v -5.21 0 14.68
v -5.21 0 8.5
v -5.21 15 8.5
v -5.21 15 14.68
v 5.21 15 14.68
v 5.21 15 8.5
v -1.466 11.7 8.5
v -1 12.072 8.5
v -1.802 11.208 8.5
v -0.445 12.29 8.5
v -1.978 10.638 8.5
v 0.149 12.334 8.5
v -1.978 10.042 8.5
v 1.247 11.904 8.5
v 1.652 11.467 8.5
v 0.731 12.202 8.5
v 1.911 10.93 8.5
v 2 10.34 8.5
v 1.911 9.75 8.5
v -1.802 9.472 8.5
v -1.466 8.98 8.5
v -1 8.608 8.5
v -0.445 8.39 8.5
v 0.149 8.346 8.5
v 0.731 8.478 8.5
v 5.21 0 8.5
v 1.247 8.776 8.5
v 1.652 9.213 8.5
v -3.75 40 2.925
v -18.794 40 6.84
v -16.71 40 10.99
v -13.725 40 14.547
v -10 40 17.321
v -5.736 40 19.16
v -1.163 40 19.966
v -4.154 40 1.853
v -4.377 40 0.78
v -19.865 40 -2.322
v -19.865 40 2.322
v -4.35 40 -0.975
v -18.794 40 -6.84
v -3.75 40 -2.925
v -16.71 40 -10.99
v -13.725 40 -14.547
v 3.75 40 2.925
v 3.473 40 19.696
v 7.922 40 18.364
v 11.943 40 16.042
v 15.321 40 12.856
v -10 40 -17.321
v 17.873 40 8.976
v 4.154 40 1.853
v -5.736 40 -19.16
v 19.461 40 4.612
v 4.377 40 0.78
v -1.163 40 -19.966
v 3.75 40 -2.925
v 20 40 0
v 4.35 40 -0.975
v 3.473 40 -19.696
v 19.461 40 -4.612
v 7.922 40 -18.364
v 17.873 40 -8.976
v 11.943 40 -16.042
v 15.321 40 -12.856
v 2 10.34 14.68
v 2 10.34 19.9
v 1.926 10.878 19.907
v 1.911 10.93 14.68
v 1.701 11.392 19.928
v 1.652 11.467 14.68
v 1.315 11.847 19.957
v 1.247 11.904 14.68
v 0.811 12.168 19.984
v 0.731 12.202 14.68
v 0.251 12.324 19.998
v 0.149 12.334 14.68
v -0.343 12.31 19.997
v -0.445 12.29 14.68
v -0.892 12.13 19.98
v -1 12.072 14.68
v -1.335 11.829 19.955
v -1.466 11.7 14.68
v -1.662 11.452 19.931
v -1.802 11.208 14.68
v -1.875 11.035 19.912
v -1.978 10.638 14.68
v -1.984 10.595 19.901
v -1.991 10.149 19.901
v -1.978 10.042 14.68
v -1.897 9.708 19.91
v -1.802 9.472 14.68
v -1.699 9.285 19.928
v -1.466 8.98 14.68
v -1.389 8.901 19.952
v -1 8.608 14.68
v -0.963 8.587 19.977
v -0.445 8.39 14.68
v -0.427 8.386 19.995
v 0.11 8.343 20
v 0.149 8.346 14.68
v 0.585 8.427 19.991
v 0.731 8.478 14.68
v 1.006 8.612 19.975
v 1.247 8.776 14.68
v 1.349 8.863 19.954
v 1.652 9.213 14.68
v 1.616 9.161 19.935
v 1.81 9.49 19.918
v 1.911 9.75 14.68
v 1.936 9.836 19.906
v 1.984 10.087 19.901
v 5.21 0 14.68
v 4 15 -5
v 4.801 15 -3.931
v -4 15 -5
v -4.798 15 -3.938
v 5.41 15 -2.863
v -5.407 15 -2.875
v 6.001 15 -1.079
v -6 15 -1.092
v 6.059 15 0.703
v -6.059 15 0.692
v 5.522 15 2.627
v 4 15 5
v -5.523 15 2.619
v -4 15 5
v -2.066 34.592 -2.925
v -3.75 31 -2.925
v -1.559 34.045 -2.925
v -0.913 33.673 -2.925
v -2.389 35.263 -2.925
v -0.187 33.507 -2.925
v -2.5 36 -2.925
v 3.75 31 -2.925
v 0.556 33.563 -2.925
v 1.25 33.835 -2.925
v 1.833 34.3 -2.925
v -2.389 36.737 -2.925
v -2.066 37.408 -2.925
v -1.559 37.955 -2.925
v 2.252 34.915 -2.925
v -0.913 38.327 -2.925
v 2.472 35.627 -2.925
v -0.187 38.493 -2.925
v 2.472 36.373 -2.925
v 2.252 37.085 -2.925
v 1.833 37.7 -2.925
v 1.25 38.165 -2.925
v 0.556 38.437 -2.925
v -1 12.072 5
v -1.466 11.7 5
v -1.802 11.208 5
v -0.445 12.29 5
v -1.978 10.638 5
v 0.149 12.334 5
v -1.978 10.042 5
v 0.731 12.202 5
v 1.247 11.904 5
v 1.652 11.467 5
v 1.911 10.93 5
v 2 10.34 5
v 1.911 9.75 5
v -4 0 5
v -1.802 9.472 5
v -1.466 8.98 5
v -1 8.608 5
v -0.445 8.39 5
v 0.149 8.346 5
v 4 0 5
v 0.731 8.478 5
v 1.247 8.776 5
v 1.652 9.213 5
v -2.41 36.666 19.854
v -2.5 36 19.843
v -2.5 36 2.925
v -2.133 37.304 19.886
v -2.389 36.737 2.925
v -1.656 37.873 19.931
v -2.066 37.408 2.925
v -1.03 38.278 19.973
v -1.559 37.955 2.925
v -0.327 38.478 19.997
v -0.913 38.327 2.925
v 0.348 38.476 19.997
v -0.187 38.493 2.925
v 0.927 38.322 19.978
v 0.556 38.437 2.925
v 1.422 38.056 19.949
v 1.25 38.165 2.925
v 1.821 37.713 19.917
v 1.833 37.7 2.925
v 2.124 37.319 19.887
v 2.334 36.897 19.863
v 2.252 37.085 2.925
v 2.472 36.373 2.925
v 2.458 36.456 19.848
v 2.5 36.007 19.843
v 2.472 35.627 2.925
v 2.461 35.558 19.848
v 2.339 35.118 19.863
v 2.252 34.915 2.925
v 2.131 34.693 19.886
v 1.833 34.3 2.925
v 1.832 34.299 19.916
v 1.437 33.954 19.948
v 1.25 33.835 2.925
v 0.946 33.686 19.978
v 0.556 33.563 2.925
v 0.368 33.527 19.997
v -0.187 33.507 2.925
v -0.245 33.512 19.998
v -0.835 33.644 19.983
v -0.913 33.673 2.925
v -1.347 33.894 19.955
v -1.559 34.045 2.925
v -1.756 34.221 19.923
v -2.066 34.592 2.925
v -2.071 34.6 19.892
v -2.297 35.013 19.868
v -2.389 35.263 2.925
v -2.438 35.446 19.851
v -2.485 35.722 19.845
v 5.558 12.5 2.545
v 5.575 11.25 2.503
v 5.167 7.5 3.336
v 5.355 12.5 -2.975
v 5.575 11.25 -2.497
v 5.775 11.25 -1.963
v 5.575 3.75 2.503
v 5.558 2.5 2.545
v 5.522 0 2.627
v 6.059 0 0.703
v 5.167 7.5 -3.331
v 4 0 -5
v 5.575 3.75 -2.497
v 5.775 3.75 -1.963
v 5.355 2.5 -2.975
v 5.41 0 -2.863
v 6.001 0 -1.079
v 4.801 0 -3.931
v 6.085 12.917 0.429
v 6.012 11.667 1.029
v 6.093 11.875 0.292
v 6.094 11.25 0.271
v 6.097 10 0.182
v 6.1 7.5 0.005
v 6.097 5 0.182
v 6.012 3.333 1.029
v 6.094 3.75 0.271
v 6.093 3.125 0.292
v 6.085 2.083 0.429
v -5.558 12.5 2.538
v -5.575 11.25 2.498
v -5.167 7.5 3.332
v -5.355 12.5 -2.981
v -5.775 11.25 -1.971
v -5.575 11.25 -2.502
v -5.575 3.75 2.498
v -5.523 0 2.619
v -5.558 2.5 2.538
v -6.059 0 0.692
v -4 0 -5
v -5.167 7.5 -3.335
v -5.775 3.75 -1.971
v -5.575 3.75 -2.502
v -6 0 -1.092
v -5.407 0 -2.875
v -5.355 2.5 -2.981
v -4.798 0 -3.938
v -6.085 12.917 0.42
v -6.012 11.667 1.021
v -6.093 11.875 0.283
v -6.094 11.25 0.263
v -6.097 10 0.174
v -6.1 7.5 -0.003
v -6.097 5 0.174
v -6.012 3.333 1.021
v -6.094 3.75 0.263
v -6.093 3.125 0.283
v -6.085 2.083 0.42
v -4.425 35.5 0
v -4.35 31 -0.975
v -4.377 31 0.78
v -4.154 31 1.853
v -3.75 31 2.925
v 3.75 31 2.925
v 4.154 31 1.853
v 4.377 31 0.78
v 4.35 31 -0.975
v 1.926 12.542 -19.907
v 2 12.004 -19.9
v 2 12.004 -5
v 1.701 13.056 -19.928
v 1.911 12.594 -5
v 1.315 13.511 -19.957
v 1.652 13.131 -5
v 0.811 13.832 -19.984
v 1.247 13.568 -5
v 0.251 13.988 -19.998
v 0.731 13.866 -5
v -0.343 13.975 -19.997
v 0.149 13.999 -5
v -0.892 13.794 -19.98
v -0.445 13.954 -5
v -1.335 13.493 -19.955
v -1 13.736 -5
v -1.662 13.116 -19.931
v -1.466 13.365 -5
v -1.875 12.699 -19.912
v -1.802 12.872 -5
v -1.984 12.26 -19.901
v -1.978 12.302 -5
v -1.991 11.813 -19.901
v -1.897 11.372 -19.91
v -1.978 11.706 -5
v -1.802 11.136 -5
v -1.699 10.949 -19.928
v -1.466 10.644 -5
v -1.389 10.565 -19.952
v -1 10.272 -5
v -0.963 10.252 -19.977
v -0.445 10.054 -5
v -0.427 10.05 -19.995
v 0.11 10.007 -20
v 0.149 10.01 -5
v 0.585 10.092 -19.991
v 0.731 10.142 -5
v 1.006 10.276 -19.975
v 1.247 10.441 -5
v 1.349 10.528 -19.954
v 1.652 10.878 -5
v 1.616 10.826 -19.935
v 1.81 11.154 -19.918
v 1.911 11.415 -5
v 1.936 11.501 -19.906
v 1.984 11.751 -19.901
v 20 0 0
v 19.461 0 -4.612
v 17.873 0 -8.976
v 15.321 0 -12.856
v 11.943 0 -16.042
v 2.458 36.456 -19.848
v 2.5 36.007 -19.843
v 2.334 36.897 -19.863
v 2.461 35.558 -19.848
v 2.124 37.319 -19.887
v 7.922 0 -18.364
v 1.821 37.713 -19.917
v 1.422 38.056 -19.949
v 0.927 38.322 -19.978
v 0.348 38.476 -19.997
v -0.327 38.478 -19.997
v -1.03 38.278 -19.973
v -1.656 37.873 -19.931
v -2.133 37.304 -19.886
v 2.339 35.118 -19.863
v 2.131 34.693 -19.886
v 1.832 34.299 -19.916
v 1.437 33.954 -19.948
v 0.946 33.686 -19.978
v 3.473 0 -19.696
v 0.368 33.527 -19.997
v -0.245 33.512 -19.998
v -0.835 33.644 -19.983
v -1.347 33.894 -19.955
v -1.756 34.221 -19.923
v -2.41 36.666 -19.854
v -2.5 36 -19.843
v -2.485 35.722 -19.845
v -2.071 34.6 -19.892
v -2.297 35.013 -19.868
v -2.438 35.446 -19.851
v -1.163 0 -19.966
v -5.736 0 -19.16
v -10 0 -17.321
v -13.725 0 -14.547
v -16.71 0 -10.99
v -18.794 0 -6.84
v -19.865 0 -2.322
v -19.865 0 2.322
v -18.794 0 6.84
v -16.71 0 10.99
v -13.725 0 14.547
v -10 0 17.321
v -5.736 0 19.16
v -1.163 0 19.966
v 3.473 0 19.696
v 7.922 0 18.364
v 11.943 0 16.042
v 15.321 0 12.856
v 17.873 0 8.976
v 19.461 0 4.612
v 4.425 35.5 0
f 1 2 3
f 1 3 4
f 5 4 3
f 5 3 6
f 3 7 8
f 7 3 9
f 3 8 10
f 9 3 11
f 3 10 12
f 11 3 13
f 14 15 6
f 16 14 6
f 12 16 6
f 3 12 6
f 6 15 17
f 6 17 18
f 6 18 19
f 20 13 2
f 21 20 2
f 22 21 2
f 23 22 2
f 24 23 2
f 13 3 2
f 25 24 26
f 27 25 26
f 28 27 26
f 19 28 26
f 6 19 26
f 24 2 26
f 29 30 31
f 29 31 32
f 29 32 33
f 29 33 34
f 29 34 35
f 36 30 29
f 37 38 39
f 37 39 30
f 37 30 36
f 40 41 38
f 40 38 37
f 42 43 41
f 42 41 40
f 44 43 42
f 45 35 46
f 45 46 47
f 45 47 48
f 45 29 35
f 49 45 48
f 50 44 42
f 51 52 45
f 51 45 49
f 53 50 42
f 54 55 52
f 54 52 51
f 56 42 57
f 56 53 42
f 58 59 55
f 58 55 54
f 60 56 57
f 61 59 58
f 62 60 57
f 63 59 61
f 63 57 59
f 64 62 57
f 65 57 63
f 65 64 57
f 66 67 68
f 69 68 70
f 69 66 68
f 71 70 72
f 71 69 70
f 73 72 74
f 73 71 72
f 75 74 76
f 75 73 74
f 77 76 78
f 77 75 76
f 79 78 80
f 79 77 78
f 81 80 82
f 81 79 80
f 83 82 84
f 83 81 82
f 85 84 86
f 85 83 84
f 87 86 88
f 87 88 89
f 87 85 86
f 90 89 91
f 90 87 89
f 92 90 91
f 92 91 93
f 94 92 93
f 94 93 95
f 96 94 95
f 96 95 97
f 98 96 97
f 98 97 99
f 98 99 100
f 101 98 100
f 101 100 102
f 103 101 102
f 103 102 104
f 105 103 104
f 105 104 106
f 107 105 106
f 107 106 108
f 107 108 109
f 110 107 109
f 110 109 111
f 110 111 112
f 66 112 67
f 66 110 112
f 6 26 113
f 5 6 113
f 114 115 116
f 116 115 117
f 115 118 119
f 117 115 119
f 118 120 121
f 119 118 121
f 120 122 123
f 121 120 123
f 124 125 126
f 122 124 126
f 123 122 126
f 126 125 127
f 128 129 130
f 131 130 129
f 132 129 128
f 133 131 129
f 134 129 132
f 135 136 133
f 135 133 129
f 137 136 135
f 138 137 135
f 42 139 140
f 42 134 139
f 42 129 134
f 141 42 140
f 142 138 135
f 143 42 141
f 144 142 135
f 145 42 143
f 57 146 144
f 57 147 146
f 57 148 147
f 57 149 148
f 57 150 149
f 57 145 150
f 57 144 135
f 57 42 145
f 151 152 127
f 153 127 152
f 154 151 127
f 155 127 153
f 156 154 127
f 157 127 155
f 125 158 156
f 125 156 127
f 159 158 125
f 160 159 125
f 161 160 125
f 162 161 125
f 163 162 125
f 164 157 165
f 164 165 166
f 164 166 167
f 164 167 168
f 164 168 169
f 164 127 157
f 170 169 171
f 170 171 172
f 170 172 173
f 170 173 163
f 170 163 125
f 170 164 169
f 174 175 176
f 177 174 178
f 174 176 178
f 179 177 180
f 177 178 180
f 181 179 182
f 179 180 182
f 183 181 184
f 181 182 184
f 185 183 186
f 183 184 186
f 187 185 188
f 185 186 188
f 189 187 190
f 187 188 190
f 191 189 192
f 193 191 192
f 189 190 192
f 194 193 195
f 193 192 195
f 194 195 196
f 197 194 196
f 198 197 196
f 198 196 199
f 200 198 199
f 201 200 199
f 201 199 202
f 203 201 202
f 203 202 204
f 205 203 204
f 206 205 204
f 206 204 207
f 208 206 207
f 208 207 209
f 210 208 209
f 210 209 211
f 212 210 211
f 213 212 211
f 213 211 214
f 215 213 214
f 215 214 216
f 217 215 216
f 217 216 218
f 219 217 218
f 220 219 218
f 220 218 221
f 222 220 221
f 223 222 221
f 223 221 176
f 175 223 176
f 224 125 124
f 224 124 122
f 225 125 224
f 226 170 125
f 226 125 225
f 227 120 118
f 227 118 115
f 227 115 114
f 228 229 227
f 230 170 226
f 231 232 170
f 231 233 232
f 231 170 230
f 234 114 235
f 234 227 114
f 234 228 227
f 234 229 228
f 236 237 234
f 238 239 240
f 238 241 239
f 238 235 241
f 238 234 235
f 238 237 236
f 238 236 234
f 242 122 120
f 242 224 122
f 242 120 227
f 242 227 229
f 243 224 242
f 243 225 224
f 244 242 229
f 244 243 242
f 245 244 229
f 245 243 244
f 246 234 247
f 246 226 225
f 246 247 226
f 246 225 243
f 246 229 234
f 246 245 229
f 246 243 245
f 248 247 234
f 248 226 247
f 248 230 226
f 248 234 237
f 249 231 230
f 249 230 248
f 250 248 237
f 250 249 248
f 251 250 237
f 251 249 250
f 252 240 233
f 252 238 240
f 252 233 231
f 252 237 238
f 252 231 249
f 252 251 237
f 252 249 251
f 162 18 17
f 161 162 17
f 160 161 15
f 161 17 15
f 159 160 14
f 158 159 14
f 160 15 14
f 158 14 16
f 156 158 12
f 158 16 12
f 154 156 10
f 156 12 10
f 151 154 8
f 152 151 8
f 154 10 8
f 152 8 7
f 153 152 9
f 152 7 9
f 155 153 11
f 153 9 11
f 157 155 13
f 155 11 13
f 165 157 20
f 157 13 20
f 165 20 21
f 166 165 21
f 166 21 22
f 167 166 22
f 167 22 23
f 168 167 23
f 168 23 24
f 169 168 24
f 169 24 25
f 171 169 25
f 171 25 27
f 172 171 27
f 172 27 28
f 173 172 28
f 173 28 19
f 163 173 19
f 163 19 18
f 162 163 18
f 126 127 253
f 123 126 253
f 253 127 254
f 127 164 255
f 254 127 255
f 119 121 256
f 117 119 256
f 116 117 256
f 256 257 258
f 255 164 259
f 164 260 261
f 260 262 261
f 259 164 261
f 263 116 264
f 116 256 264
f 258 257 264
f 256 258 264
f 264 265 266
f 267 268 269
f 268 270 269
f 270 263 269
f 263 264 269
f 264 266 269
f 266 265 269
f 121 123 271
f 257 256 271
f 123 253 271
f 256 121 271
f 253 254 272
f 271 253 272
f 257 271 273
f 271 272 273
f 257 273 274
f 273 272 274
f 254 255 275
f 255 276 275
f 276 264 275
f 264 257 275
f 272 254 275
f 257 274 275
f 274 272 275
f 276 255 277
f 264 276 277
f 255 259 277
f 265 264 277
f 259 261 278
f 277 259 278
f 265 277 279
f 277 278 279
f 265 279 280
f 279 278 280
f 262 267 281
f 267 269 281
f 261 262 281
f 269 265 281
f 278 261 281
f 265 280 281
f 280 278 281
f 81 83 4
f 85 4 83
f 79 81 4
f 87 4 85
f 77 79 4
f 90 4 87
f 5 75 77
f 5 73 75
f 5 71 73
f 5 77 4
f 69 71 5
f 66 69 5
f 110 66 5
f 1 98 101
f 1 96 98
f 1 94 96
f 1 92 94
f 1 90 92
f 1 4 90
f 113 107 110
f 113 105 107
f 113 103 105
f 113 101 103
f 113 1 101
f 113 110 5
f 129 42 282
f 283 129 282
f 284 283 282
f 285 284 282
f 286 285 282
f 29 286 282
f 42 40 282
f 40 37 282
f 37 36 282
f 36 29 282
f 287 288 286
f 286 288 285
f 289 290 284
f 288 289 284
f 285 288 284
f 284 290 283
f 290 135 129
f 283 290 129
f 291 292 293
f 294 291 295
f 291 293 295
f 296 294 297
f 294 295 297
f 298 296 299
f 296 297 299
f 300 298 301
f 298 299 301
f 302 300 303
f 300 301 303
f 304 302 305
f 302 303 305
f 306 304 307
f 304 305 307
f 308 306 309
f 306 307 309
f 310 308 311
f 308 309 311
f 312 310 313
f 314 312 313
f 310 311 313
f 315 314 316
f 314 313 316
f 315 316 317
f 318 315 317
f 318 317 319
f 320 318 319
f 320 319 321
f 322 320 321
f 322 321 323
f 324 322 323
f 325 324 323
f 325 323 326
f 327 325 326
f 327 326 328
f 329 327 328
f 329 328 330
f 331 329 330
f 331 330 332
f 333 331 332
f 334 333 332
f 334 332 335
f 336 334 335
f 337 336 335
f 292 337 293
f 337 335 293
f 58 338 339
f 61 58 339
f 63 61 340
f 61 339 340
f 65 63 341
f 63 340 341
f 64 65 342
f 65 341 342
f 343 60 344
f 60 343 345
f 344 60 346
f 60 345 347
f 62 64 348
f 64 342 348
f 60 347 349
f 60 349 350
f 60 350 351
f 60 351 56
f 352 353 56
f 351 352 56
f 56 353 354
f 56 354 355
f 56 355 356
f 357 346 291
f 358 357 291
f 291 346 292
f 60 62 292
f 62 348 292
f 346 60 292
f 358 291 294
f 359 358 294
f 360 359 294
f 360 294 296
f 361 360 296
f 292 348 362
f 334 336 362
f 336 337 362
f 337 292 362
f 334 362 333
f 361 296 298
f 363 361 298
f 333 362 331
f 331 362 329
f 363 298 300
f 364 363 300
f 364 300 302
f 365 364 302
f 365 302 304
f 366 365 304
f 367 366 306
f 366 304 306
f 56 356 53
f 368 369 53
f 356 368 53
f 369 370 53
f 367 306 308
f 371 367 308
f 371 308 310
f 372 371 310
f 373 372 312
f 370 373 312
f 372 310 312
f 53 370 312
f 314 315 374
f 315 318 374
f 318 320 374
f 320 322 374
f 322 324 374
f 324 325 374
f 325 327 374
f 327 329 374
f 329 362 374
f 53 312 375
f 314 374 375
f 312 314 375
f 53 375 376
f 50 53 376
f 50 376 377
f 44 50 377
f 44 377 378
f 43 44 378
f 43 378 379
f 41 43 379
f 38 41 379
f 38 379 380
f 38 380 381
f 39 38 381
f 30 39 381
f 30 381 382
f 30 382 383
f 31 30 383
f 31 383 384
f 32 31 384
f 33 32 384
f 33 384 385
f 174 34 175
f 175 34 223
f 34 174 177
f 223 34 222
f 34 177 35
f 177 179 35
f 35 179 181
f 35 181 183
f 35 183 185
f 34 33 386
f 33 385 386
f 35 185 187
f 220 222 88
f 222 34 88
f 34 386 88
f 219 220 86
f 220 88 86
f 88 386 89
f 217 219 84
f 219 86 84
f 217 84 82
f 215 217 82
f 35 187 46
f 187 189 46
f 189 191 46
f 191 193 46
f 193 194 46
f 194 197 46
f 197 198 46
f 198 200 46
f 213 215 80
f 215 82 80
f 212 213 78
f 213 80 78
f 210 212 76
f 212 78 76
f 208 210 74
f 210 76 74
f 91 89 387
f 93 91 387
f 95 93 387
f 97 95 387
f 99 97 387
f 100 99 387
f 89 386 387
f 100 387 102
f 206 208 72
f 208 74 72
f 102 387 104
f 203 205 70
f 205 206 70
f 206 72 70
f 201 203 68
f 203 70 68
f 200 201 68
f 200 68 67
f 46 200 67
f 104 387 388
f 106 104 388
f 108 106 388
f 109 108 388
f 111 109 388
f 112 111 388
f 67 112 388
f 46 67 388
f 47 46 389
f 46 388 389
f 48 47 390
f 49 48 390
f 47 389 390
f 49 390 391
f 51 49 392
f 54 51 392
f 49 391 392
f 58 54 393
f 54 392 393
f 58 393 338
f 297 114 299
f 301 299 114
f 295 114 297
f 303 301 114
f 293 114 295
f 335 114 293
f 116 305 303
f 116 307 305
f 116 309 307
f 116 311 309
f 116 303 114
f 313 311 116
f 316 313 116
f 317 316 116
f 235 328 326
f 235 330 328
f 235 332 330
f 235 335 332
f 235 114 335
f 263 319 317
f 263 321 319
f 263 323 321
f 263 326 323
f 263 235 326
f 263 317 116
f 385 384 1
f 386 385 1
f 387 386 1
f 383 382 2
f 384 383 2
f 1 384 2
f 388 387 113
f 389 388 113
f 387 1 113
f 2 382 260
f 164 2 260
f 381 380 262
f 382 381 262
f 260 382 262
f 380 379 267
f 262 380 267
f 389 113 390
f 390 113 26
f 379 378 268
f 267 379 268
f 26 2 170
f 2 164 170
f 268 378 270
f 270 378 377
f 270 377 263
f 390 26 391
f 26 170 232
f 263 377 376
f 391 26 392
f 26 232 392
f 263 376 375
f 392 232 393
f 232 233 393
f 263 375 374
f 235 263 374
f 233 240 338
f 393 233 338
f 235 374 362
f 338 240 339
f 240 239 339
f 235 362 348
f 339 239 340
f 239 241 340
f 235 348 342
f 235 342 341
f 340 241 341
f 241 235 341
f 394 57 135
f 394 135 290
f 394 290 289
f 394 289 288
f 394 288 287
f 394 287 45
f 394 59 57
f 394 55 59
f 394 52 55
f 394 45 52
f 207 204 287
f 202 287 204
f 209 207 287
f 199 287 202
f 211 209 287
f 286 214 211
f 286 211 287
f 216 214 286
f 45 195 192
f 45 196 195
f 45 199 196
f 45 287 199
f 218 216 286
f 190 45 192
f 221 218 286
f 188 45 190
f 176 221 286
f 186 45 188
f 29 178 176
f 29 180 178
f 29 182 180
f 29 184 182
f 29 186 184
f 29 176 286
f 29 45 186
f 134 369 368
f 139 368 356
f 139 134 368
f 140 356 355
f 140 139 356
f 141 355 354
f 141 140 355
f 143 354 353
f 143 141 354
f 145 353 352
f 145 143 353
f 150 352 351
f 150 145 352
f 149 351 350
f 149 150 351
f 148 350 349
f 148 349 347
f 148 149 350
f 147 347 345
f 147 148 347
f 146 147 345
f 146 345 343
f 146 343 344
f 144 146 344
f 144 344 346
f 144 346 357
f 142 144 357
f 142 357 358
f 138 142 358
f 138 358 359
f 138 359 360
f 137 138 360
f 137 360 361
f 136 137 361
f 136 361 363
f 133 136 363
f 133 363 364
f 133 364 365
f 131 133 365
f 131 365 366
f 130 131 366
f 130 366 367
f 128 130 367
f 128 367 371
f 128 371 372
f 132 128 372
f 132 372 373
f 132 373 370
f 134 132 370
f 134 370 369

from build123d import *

# Parameters (mm, degrees)
SKETCH1_R               = 20
BOSS_EXTRUDE1_DEPTH     = 40
CUT_EXTRUDE1_DEPTH      = 15
SKETCH3_R               = 2
CUT_EXTRUDE2_DEPTH      = 15
CUT_EXTRUDE3_DEPTH      = 9
SKETCH5_R               = 2.5
CUT_EXTRUDE4_DEPTH      = 23.925000127
CUT_EXTRUDE4_DEPTH_BACK = 18.0750001
SKETCH6_W               = 10.42
SKETCH6_H               = 6.18
CUT_EXTRUDE5_DEPTH      = 15
SKETCH7_R               = 2
CUT_EXTRUDE6_DEPTH      = 15
CUT_EXTRUDE6_DEPTH_BACK = 10


with BuildPart() as part:
    # Sketch1 → Boss-Extrude1 (new body)
    with BuildSketch(Plane(origin=(0, 0, 0), x_dir=(1, 0, 0), z_dir=(0, 1, 0))):
        Circle(SKETCH1_R)
    extrude(amount=BOSS_EXTRUDE1_DEPTH)

    # Sketch2 → Cut-Extrude1 (cut)
    with BuildSketch(Plane.XZ):
        with BuildLine():
            Line((-4.000002932, 5), (3.999997068, 5))
            add(Edge.make_bspline(
                [(3.999997068, 5), (8.199974497, 0.009249301), (3.999997068, -5)],
                knots=[0, 0, 0, 1, 1, 1], degree=2))
            Line((3.999997068, -5), (-4.000002932, -5))
            add(Edge.make_bspline(
                [(-4.000002932, 5), (-8.199982148, -0.00561634), (-4.000002932, -5)],
                knots=[0, 0, 0, 1, 1, 1], degree=2))
        make_face()
    extrude(amount=-CUT_EXTRUDE1_DEPTH, mode=Mode.SUBTRACT)

    # Sketch3 → Cut-Extrude2 (cut)
    with BuildSketch(Plane.XY.offset(-5)):
        with Locations((0, 12.004234523)):
            Circle(SKETCH3_R)
    extrude(amount=-CUT_EXTRUDE2_DEPTH, mode=Mode.SUBTRACT)

    # Sketch4 → Cut-Extrude3 (cut)
    with BuildSketch(Plane(origin=(0, 40, 0), x_dir=(1, 0, 0), z_dir=(0, 1, 0))):
        with BuildLine():
            Line((-3.75, 2.925), (3.75, 2.925))
            add(Edge.make_bspline(
                [(3.75, 2.925), (5.10000002, -3.7956e-05), (3.75, -2.925)],
                knots=[0, 0, 0, 1, 1, 1], degree=2))
            Line((3.75, -2.925), (-3.75, -2.925))
            add(Edge.make_bspline(
                [(-3.75, 2.925), (-5.10000002, -3.7956e-05), (-3.75, -2.925)],
                knots=[0, 0, 0, 1, 1, 1], degree=2))
        make_face()
    extrude(amount=-CUT_EXTRUDE3_DEPTH, mode=Mode.SUBTRACT)

    # Sketch5 → Cut-Extrude4 (cut, two sides)
    with BuildSketch(Plane(origin=(0, 0, 2.925), x_dir=(-1, 0, 0), z_dir=(0, 0, -1))) as cut_extrude4_sk:
        with Locations((0, 36)):
            Circle(SKETCH5_R)
    extrude(amount=CUT_EXTRUDE4_DEPTH, mode=Mode.SUBTRACT)
    extrude(cut_extrude4_sk.sketch, amount=-CUT_EXTRUDE4_DEPTH_BACK, mode=Mode.SUBTRACT)

    # Sketch6 → Cut-Extrude5 (cut)
    with BuildSketch(Plane.XZ):
        with Locations((0, 11.59)):
            Rectangle(SKETCH6_W, SKETCH6_H)
    extrude(amount=-CUT_EXTRUDE5_DEPTH, mode=Mode.SUBTRACT)

    # Sketch7 → Cut-Extrude6 (cut, two sides)
    with BuildSketch(Plane.XY.offset(8.5)) as cut_extrude6_sk:
        with Locations((0, 10.34)):
            Circle(SKETCH7_R)
    extrude(amount=CUT_EXTRUDE6_DEPTH, mode=Mode.SUBTRACT)
    extrude(cut_extrude6_sk.sketch, amount=-CUT_EXTRUDE6_DEPTH_BACK, mode=Mode.SUBTRACT)


solid = part.part
